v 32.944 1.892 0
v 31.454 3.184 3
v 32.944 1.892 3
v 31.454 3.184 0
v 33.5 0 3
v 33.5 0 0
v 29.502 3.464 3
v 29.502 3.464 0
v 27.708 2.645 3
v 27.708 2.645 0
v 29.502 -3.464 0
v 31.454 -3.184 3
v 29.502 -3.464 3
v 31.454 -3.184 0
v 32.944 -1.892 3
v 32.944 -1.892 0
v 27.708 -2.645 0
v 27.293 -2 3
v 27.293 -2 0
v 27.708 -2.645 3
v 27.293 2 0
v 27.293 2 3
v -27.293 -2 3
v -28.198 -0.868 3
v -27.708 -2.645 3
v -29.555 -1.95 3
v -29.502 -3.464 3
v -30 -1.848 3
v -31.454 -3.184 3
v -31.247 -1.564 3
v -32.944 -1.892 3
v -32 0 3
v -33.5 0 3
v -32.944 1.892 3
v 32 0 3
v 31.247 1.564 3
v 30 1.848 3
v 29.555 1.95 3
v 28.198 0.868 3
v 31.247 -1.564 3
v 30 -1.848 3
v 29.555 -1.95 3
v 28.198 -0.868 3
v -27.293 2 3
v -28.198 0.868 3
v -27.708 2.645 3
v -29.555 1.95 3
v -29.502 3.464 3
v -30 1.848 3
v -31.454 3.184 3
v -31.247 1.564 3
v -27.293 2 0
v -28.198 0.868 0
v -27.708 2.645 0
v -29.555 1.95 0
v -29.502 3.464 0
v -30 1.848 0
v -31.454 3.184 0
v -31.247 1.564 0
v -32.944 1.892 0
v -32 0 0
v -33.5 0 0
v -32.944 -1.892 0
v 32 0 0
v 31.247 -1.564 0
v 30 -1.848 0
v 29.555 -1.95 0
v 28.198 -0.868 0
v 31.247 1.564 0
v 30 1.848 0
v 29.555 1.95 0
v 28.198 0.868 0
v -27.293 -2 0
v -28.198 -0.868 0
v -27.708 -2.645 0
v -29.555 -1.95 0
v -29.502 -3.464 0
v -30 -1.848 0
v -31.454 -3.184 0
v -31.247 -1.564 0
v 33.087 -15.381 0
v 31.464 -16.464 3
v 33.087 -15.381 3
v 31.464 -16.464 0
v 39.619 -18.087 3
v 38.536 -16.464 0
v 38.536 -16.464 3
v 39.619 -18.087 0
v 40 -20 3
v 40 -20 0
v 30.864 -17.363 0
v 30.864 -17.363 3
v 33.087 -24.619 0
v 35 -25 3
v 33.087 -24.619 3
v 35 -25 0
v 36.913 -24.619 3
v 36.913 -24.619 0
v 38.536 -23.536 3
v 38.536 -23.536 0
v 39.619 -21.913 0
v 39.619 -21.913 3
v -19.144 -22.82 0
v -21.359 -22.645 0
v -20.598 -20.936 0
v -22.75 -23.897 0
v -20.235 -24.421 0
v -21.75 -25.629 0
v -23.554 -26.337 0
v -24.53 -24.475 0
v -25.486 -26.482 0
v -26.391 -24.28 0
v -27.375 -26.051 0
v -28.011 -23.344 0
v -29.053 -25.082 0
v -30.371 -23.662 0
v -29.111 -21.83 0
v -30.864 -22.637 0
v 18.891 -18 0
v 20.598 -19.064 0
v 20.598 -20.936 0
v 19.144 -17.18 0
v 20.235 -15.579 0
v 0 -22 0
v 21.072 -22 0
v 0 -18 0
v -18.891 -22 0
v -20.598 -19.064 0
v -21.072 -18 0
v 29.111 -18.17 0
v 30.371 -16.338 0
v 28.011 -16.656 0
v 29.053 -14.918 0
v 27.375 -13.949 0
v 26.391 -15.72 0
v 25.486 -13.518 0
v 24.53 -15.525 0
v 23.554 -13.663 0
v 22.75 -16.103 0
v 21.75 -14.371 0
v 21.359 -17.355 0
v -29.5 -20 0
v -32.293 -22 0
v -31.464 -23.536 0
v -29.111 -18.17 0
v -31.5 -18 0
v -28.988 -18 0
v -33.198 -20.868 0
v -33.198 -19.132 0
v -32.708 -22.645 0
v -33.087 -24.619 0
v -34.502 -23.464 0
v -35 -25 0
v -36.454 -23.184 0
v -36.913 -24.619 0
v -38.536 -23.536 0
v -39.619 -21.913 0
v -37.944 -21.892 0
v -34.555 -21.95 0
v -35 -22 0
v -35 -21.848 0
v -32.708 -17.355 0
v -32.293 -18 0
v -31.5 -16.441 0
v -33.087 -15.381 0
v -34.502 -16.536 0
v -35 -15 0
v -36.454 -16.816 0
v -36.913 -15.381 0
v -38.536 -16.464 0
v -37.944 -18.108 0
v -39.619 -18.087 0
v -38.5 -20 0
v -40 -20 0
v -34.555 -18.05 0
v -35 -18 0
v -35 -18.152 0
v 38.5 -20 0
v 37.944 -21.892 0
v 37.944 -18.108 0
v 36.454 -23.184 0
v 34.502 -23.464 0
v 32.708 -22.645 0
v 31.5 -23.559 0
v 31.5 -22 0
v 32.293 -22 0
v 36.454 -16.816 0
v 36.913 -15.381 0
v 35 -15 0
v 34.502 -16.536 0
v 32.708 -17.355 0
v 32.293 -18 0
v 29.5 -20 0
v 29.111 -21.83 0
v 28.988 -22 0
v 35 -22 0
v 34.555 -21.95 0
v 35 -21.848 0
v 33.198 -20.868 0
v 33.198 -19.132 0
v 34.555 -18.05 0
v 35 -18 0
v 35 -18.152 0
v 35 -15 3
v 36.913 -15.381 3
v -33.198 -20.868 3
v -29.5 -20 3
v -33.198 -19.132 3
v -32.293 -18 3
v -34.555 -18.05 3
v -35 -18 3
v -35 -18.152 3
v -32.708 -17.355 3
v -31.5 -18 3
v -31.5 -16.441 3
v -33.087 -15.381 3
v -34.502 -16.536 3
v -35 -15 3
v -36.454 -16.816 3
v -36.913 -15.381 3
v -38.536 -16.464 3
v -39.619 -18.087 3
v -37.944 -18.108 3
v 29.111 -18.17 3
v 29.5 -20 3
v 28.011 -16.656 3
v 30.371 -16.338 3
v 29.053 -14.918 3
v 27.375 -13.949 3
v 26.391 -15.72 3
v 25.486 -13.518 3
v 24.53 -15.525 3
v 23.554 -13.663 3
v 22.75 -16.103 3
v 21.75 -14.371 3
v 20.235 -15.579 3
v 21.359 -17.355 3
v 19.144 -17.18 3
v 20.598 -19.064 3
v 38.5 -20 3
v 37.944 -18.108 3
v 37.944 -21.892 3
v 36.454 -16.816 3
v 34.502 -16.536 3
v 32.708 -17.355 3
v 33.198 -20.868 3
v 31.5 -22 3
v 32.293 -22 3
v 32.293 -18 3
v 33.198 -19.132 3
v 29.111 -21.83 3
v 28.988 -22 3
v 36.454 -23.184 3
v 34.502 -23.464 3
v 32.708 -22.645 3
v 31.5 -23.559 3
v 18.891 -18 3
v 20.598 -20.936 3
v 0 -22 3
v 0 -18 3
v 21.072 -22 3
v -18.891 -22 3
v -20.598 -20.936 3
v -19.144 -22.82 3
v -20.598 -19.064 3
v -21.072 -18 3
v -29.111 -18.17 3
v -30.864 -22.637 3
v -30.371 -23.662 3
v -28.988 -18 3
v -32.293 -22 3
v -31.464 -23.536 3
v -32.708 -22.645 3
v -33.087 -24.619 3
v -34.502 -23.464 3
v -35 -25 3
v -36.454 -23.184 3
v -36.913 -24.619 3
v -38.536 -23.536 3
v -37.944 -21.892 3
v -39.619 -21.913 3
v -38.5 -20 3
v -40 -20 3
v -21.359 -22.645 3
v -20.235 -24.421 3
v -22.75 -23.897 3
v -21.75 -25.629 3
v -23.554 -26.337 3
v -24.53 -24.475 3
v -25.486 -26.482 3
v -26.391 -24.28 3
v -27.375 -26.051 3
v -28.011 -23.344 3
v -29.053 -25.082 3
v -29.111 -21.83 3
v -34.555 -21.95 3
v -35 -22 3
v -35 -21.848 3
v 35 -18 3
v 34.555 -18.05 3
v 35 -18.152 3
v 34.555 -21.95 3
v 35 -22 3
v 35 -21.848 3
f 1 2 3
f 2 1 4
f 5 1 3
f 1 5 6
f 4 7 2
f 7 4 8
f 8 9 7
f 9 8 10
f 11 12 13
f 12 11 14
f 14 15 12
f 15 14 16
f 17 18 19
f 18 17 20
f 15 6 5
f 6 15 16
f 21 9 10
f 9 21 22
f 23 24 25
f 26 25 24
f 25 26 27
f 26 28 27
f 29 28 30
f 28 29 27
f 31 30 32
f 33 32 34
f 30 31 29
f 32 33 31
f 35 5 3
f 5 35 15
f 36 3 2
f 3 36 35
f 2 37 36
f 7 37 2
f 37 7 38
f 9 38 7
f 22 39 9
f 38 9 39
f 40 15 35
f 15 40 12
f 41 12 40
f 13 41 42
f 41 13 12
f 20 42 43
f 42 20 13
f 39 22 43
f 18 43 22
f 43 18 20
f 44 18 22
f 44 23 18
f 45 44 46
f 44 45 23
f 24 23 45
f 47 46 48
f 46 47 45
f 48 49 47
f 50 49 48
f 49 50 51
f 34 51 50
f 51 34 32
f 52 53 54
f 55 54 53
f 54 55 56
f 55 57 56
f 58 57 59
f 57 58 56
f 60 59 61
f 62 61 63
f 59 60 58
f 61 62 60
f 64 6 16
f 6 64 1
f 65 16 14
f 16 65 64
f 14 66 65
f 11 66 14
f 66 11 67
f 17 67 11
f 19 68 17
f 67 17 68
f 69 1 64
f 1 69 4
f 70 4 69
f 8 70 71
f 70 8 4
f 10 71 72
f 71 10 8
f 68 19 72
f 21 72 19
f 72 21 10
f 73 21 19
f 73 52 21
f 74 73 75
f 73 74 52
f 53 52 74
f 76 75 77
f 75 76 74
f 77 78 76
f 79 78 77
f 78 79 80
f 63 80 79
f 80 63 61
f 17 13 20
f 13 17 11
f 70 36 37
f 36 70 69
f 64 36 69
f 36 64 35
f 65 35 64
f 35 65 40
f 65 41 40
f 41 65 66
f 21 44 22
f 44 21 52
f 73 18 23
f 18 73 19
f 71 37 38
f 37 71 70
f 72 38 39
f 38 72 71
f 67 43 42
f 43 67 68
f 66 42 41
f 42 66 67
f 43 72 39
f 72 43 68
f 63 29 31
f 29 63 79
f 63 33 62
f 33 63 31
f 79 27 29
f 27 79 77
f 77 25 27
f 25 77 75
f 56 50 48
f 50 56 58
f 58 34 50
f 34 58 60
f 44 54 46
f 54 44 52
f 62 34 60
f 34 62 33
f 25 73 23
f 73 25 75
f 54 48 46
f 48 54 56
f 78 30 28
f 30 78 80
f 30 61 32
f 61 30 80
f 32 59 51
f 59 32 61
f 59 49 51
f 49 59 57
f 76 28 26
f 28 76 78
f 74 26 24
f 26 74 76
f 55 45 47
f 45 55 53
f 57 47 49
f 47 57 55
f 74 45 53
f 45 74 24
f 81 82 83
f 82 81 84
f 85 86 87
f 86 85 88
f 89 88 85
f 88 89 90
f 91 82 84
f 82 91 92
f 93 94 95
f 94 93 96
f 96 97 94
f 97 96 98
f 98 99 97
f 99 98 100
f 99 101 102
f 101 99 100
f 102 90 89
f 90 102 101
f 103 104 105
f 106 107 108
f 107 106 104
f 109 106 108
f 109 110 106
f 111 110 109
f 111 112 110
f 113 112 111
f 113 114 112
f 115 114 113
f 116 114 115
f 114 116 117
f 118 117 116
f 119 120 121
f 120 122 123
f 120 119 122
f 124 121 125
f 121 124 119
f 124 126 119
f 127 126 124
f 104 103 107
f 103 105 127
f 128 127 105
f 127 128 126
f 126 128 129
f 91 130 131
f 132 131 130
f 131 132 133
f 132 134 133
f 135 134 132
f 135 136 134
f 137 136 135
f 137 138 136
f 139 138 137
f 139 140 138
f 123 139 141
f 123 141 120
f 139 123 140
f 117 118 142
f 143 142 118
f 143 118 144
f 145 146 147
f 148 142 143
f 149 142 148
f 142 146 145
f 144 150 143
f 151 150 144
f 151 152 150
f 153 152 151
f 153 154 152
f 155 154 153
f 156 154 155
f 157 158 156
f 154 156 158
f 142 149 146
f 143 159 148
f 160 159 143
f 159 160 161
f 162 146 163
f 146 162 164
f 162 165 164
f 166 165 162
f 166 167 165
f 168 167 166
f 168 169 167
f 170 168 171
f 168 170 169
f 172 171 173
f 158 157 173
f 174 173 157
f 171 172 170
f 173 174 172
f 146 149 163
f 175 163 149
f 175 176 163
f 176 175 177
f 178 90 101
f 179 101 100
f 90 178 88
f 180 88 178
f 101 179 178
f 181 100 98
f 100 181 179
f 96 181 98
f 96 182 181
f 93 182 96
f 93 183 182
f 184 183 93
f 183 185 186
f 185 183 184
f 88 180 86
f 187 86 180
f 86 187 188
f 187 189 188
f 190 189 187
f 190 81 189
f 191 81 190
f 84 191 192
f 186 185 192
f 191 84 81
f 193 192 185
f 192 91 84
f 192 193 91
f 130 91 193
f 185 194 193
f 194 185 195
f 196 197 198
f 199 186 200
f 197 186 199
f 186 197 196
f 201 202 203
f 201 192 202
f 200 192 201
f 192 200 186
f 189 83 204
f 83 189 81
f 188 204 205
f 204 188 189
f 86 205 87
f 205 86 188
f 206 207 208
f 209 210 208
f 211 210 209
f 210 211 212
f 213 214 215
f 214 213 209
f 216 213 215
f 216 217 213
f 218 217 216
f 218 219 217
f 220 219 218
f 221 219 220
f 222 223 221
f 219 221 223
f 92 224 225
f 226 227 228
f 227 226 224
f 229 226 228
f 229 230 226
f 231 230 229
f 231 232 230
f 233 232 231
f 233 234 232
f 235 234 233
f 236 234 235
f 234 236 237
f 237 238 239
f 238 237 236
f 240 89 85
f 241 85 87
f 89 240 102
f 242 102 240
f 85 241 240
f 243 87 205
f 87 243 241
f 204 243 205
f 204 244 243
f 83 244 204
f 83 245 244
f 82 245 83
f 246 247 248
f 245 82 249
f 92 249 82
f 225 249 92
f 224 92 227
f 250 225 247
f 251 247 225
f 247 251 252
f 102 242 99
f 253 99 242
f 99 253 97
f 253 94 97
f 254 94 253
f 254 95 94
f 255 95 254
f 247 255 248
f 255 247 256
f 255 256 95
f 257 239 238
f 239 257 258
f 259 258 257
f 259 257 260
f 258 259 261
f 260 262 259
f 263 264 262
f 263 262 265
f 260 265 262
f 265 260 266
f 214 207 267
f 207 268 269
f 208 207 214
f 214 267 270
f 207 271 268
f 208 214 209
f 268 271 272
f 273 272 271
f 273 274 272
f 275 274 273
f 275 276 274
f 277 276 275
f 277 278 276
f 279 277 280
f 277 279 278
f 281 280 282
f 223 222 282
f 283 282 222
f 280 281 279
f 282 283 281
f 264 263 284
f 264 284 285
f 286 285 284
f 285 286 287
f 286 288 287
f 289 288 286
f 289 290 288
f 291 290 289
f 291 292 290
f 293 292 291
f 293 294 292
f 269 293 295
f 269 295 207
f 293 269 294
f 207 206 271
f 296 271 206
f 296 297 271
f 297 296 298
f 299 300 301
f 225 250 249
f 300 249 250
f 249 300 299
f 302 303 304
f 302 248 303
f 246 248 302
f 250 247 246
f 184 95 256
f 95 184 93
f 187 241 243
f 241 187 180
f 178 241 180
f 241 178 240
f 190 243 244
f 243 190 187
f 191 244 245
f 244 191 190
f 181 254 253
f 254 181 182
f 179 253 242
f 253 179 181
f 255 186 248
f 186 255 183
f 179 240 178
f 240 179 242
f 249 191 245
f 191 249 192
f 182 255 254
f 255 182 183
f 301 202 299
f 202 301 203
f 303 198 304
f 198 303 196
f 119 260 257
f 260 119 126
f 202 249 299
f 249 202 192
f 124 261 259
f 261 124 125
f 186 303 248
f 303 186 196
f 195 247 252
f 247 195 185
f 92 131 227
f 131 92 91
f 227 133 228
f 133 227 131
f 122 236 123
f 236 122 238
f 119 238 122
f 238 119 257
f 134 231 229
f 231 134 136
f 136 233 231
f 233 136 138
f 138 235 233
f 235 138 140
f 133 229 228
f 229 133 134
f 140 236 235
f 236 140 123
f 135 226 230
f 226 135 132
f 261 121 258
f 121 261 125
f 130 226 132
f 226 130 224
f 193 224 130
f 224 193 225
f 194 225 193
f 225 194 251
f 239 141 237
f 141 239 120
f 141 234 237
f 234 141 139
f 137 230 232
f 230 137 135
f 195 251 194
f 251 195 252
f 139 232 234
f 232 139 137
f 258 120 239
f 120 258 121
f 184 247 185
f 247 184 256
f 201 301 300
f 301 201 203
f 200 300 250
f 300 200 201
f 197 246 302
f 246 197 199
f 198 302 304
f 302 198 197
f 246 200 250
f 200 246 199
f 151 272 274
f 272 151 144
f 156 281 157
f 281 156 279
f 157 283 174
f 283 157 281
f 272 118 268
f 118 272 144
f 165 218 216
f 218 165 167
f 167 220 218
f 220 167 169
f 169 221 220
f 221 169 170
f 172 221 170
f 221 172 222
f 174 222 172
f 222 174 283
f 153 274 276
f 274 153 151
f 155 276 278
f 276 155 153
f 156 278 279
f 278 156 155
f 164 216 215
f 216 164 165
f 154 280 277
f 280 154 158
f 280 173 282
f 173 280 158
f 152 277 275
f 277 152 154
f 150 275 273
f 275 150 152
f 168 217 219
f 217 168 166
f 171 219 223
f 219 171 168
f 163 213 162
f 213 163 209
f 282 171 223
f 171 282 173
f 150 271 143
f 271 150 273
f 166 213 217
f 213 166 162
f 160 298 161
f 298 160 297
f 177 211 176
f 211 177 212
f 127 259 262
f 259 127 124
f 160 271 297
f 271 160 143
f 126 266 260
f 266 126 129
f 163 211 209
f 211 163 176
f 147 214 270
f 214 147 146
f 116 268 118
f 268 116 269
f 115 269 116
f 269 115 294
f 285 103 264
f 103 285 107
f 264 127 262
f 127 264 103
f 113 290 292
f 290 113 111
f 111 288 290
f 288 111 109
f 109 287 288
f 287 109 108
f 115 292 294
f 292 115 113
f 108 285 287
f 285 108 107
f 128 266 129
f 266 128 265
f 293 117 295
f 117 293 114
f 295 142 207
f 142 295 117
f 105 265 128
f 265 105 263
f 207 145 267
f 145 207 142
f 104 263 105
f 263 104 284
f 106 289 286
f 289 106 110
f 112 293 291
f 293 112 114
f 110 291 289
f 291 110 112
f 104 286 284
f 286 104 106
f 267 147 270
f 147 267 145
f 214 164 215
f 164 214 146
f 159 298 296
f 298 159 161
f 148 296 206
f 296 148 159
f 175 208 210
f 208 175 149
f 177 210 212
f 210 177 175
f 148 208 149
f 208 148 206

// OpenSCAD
union() {
	difference() {
		union() {
			translate(v = [0, -2.0000000000, 0]) {
				cube(size = [30.0000000000, 4, 3]);
			}
			translate(v = [30.0000000000, 0, 0]) {
				difference() {
					cylinder(d = 7, h = 3);
					translate(v = [0, 0, -1.5000000000]) {
						cylinder(d = 4, h = 6);
					}
				}
			}
		}
		translate(v = [30.0000000000, 0, 0]) {
			cylinder(d = 4, h = 3);
		}
	}
	rotate(a = [0, 0, 180]) {
		difference() {
			union() {
				translate(v = [0, -2.0000000000, 0]) {
					cube(size = [30.0000000000, 4, 3]);
				}
				translate(v = [30.0000000000, 0, 0]) {
					difference() {
						cylinder(d = 7, h = 3);
						translate(v = [0, 0, -1.5000000000]) {
							cylinder(d = 4, h = 6);
						}
					}
				}
			}
			translate(v = [30.0000000000, 0, 0]) {
				cylinder(d = 4, h = 3);
			}
		}
	}
	translate(v = [0, -20, 0]) {
		union() {
			difference() {
				union() {
					translate(v = [0, -2.0000000000, 0]) {
						cube(size = [35.0000000000, 4, 3]);
					}
					translate(v = [35.0000000000, 0, 0]) {
						difference() {
							cylinder(d = 10, h = 3);
							cylinder(d = 7, h = 3);
							rotate_extrude($fn = 180, angle = 15) {
								translate(v = [90, 0, 0]) {
									square(size = [2.5000000000, 25]);
								}
							}
						}
					}
					translate(v = [25.0000000000, 0, 0]) {
						cylinder(d = 13, h = 3);
					}
				}
				translate(v = [25.0000000000, 0, 0]) {
					cylinder(d = 9, h = 3);
				}
				translate(v = [0, -15.0000000000, 0]) {
					cube(size = [31.5000000000, 13, 3]);
				}
				translate(v = [35.0000000000, 0, 0]) {
					cylinder(d = 4, h = 3);
				}
			}
			rotate(a = [0, 0, 180]) {
				difference() {
					union() {
						translate(v = [0, -2.0000000000, 0]) {
							cube(size = [35.0000000000, 4, 3]);
						}
						translate(v = [35.0000000000, 0, 0]) {
							difference() {
								cylinder(d = 10, h = 3);
								cylinder(d = 7, h = 3);
								rotate_extrude($fn = 180, angle = 15) {
									translate(v = [90, 0, 0]) {
										square(size = [2.5000000000, 25]);
									}
								}
							}
						}
						translate(v = [25.0000000000, 0, 0]) {
							cylinder(d = 13, h = 3);
						}
					}
					translate(v = [25.0000000000, 0, 0]) {
						cylinder(d = 9, h = 3);
					}
					translate(v = [0, -15.0000000000, 0]) {
						cube(size = [31.5000000000, 13, 3]);
					}
					translate(v = [35.0000000000, 0, 0]) {
						cylinder(d = 4, h = 3);
					}
				}
			}
		}
	}
}
